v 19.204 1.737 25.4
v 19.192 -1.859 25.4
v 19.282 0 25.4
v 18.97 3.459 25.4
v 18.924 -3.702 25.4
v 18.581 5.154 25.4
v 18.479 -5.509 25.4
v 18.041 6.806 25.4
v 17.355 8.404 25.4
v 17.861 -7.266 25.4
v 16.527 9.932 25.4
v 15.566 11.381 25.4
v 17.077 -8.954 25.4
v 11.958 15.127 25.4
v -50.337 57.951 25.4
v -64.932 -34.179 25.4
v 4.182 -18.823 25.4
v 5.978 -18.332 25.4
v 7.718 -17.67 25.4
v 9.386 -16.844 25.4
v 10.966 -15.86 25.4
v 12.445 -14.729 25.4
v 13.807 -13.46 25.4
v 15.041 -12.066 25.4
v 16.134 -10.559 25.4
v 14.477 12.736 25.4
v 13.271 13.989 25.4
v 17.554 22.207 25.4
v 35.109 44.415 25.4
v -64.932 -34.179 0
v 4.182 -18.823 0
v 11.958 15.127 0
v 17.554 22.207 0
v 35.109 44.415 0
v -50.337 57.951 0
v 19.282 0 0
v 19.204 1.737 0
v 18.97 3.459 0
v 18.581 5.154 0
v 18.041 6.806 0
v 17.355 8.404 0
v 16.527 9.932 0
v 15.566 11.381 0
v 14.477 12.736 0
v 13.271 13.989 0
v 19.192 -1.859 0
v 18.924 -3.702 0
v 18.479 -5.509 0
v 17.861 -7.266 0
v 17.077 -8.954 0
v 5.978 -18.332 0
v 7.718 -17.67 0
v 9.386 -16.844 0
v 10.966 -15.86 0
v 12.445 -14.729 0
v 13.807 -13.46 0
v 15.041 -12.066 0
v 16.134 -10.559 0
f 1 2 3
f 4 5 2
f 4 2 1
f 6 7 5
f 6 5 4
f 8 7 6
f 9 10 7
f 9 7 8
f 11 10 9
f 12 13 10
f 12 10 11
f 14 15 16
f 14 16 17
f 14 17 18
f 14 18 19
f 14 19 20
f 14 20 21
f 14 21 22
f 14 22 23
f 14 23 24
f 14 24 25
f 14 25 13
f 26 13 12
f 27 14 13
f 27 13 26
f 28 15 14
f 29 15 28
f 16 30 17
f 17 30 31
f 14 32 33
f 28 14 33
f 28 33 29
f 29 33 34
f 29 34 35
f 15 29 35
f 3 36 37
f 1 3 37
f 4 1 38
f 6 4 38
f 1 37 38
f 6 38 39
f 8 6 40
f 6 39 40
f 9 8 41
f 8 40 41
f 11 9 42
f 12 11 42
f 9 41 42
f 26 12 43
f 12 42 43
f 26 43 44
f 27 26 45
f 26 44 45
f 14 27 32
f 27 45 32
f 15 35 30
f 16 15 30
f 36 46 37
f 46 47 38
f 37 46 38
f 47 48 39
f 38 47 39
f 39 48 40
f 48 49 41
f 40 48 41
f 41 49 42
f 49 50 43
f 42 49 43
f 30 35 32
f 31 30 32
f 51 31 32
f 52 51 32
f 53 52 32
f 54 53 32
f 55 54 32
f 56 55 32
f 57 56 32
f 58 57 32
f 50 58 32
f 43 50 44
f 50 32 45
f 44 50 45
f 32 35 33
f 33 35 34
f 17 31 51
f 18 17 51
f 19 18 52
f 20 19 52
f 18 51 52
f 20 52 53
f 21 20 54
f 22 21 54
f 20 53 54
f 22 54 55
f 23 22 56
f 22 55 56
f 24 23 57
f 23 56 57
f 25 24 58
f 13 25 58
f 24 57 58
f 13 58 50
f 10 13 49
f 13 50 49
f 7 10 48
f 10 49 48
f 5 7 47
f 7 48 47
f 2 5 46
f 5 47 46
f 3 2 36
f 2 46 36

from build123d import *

# Parameters (mm, degrees)
F1_DEPTH = 25.4


# Not quite as in the source:
# - the program builds the solid bodies; features that only make, move or delete a surface that nothing else refers to are left out


with BuildPart() as f1:
    # F0 (on Top) → F1 (new body)
    with BuildSketch(Plane.XY):
        with BuildLine():
            ThreePointArc((19.282356954, 0), (17.3548102292, 8.4035618406), (11.957541655, 15.127011842))
            ThreePointArc((11.957541655, 15.127011842), (-18.7957142624, 4.3046968609), (4.1820366195, -18.823385971))
            ThreePointArc((4.1820366195, -18.823385971), (15.0407581689, -12.0658560991), (19.282356954, 0))
        make_face()
        with BuildLine():
            Line((11.957541655, 15.127011842), (17.5544340163, 22.2074184567))
            Line((17.5544340163, 22.2074184567), (35.1088680327, 44.4148369133))
            Line((35.1088680327, 44.4148369133), (-50.3368154168, 57.9507872462))
            Line((-50.3368154168, 57.9507872462), (-64.9315572131, -34.1785170794))
            Line((-64.9315572131, -34.1785170794), (4.1820366195, -18.823385971))
            ThreePointArc((4.1820366195, -18.823385971), (-18.7957142624, 4.3046968609), (11.957541655, 15.127011842))
        make_face()
    extrude(amount=F1_DEPTH)


solid = f1.part
